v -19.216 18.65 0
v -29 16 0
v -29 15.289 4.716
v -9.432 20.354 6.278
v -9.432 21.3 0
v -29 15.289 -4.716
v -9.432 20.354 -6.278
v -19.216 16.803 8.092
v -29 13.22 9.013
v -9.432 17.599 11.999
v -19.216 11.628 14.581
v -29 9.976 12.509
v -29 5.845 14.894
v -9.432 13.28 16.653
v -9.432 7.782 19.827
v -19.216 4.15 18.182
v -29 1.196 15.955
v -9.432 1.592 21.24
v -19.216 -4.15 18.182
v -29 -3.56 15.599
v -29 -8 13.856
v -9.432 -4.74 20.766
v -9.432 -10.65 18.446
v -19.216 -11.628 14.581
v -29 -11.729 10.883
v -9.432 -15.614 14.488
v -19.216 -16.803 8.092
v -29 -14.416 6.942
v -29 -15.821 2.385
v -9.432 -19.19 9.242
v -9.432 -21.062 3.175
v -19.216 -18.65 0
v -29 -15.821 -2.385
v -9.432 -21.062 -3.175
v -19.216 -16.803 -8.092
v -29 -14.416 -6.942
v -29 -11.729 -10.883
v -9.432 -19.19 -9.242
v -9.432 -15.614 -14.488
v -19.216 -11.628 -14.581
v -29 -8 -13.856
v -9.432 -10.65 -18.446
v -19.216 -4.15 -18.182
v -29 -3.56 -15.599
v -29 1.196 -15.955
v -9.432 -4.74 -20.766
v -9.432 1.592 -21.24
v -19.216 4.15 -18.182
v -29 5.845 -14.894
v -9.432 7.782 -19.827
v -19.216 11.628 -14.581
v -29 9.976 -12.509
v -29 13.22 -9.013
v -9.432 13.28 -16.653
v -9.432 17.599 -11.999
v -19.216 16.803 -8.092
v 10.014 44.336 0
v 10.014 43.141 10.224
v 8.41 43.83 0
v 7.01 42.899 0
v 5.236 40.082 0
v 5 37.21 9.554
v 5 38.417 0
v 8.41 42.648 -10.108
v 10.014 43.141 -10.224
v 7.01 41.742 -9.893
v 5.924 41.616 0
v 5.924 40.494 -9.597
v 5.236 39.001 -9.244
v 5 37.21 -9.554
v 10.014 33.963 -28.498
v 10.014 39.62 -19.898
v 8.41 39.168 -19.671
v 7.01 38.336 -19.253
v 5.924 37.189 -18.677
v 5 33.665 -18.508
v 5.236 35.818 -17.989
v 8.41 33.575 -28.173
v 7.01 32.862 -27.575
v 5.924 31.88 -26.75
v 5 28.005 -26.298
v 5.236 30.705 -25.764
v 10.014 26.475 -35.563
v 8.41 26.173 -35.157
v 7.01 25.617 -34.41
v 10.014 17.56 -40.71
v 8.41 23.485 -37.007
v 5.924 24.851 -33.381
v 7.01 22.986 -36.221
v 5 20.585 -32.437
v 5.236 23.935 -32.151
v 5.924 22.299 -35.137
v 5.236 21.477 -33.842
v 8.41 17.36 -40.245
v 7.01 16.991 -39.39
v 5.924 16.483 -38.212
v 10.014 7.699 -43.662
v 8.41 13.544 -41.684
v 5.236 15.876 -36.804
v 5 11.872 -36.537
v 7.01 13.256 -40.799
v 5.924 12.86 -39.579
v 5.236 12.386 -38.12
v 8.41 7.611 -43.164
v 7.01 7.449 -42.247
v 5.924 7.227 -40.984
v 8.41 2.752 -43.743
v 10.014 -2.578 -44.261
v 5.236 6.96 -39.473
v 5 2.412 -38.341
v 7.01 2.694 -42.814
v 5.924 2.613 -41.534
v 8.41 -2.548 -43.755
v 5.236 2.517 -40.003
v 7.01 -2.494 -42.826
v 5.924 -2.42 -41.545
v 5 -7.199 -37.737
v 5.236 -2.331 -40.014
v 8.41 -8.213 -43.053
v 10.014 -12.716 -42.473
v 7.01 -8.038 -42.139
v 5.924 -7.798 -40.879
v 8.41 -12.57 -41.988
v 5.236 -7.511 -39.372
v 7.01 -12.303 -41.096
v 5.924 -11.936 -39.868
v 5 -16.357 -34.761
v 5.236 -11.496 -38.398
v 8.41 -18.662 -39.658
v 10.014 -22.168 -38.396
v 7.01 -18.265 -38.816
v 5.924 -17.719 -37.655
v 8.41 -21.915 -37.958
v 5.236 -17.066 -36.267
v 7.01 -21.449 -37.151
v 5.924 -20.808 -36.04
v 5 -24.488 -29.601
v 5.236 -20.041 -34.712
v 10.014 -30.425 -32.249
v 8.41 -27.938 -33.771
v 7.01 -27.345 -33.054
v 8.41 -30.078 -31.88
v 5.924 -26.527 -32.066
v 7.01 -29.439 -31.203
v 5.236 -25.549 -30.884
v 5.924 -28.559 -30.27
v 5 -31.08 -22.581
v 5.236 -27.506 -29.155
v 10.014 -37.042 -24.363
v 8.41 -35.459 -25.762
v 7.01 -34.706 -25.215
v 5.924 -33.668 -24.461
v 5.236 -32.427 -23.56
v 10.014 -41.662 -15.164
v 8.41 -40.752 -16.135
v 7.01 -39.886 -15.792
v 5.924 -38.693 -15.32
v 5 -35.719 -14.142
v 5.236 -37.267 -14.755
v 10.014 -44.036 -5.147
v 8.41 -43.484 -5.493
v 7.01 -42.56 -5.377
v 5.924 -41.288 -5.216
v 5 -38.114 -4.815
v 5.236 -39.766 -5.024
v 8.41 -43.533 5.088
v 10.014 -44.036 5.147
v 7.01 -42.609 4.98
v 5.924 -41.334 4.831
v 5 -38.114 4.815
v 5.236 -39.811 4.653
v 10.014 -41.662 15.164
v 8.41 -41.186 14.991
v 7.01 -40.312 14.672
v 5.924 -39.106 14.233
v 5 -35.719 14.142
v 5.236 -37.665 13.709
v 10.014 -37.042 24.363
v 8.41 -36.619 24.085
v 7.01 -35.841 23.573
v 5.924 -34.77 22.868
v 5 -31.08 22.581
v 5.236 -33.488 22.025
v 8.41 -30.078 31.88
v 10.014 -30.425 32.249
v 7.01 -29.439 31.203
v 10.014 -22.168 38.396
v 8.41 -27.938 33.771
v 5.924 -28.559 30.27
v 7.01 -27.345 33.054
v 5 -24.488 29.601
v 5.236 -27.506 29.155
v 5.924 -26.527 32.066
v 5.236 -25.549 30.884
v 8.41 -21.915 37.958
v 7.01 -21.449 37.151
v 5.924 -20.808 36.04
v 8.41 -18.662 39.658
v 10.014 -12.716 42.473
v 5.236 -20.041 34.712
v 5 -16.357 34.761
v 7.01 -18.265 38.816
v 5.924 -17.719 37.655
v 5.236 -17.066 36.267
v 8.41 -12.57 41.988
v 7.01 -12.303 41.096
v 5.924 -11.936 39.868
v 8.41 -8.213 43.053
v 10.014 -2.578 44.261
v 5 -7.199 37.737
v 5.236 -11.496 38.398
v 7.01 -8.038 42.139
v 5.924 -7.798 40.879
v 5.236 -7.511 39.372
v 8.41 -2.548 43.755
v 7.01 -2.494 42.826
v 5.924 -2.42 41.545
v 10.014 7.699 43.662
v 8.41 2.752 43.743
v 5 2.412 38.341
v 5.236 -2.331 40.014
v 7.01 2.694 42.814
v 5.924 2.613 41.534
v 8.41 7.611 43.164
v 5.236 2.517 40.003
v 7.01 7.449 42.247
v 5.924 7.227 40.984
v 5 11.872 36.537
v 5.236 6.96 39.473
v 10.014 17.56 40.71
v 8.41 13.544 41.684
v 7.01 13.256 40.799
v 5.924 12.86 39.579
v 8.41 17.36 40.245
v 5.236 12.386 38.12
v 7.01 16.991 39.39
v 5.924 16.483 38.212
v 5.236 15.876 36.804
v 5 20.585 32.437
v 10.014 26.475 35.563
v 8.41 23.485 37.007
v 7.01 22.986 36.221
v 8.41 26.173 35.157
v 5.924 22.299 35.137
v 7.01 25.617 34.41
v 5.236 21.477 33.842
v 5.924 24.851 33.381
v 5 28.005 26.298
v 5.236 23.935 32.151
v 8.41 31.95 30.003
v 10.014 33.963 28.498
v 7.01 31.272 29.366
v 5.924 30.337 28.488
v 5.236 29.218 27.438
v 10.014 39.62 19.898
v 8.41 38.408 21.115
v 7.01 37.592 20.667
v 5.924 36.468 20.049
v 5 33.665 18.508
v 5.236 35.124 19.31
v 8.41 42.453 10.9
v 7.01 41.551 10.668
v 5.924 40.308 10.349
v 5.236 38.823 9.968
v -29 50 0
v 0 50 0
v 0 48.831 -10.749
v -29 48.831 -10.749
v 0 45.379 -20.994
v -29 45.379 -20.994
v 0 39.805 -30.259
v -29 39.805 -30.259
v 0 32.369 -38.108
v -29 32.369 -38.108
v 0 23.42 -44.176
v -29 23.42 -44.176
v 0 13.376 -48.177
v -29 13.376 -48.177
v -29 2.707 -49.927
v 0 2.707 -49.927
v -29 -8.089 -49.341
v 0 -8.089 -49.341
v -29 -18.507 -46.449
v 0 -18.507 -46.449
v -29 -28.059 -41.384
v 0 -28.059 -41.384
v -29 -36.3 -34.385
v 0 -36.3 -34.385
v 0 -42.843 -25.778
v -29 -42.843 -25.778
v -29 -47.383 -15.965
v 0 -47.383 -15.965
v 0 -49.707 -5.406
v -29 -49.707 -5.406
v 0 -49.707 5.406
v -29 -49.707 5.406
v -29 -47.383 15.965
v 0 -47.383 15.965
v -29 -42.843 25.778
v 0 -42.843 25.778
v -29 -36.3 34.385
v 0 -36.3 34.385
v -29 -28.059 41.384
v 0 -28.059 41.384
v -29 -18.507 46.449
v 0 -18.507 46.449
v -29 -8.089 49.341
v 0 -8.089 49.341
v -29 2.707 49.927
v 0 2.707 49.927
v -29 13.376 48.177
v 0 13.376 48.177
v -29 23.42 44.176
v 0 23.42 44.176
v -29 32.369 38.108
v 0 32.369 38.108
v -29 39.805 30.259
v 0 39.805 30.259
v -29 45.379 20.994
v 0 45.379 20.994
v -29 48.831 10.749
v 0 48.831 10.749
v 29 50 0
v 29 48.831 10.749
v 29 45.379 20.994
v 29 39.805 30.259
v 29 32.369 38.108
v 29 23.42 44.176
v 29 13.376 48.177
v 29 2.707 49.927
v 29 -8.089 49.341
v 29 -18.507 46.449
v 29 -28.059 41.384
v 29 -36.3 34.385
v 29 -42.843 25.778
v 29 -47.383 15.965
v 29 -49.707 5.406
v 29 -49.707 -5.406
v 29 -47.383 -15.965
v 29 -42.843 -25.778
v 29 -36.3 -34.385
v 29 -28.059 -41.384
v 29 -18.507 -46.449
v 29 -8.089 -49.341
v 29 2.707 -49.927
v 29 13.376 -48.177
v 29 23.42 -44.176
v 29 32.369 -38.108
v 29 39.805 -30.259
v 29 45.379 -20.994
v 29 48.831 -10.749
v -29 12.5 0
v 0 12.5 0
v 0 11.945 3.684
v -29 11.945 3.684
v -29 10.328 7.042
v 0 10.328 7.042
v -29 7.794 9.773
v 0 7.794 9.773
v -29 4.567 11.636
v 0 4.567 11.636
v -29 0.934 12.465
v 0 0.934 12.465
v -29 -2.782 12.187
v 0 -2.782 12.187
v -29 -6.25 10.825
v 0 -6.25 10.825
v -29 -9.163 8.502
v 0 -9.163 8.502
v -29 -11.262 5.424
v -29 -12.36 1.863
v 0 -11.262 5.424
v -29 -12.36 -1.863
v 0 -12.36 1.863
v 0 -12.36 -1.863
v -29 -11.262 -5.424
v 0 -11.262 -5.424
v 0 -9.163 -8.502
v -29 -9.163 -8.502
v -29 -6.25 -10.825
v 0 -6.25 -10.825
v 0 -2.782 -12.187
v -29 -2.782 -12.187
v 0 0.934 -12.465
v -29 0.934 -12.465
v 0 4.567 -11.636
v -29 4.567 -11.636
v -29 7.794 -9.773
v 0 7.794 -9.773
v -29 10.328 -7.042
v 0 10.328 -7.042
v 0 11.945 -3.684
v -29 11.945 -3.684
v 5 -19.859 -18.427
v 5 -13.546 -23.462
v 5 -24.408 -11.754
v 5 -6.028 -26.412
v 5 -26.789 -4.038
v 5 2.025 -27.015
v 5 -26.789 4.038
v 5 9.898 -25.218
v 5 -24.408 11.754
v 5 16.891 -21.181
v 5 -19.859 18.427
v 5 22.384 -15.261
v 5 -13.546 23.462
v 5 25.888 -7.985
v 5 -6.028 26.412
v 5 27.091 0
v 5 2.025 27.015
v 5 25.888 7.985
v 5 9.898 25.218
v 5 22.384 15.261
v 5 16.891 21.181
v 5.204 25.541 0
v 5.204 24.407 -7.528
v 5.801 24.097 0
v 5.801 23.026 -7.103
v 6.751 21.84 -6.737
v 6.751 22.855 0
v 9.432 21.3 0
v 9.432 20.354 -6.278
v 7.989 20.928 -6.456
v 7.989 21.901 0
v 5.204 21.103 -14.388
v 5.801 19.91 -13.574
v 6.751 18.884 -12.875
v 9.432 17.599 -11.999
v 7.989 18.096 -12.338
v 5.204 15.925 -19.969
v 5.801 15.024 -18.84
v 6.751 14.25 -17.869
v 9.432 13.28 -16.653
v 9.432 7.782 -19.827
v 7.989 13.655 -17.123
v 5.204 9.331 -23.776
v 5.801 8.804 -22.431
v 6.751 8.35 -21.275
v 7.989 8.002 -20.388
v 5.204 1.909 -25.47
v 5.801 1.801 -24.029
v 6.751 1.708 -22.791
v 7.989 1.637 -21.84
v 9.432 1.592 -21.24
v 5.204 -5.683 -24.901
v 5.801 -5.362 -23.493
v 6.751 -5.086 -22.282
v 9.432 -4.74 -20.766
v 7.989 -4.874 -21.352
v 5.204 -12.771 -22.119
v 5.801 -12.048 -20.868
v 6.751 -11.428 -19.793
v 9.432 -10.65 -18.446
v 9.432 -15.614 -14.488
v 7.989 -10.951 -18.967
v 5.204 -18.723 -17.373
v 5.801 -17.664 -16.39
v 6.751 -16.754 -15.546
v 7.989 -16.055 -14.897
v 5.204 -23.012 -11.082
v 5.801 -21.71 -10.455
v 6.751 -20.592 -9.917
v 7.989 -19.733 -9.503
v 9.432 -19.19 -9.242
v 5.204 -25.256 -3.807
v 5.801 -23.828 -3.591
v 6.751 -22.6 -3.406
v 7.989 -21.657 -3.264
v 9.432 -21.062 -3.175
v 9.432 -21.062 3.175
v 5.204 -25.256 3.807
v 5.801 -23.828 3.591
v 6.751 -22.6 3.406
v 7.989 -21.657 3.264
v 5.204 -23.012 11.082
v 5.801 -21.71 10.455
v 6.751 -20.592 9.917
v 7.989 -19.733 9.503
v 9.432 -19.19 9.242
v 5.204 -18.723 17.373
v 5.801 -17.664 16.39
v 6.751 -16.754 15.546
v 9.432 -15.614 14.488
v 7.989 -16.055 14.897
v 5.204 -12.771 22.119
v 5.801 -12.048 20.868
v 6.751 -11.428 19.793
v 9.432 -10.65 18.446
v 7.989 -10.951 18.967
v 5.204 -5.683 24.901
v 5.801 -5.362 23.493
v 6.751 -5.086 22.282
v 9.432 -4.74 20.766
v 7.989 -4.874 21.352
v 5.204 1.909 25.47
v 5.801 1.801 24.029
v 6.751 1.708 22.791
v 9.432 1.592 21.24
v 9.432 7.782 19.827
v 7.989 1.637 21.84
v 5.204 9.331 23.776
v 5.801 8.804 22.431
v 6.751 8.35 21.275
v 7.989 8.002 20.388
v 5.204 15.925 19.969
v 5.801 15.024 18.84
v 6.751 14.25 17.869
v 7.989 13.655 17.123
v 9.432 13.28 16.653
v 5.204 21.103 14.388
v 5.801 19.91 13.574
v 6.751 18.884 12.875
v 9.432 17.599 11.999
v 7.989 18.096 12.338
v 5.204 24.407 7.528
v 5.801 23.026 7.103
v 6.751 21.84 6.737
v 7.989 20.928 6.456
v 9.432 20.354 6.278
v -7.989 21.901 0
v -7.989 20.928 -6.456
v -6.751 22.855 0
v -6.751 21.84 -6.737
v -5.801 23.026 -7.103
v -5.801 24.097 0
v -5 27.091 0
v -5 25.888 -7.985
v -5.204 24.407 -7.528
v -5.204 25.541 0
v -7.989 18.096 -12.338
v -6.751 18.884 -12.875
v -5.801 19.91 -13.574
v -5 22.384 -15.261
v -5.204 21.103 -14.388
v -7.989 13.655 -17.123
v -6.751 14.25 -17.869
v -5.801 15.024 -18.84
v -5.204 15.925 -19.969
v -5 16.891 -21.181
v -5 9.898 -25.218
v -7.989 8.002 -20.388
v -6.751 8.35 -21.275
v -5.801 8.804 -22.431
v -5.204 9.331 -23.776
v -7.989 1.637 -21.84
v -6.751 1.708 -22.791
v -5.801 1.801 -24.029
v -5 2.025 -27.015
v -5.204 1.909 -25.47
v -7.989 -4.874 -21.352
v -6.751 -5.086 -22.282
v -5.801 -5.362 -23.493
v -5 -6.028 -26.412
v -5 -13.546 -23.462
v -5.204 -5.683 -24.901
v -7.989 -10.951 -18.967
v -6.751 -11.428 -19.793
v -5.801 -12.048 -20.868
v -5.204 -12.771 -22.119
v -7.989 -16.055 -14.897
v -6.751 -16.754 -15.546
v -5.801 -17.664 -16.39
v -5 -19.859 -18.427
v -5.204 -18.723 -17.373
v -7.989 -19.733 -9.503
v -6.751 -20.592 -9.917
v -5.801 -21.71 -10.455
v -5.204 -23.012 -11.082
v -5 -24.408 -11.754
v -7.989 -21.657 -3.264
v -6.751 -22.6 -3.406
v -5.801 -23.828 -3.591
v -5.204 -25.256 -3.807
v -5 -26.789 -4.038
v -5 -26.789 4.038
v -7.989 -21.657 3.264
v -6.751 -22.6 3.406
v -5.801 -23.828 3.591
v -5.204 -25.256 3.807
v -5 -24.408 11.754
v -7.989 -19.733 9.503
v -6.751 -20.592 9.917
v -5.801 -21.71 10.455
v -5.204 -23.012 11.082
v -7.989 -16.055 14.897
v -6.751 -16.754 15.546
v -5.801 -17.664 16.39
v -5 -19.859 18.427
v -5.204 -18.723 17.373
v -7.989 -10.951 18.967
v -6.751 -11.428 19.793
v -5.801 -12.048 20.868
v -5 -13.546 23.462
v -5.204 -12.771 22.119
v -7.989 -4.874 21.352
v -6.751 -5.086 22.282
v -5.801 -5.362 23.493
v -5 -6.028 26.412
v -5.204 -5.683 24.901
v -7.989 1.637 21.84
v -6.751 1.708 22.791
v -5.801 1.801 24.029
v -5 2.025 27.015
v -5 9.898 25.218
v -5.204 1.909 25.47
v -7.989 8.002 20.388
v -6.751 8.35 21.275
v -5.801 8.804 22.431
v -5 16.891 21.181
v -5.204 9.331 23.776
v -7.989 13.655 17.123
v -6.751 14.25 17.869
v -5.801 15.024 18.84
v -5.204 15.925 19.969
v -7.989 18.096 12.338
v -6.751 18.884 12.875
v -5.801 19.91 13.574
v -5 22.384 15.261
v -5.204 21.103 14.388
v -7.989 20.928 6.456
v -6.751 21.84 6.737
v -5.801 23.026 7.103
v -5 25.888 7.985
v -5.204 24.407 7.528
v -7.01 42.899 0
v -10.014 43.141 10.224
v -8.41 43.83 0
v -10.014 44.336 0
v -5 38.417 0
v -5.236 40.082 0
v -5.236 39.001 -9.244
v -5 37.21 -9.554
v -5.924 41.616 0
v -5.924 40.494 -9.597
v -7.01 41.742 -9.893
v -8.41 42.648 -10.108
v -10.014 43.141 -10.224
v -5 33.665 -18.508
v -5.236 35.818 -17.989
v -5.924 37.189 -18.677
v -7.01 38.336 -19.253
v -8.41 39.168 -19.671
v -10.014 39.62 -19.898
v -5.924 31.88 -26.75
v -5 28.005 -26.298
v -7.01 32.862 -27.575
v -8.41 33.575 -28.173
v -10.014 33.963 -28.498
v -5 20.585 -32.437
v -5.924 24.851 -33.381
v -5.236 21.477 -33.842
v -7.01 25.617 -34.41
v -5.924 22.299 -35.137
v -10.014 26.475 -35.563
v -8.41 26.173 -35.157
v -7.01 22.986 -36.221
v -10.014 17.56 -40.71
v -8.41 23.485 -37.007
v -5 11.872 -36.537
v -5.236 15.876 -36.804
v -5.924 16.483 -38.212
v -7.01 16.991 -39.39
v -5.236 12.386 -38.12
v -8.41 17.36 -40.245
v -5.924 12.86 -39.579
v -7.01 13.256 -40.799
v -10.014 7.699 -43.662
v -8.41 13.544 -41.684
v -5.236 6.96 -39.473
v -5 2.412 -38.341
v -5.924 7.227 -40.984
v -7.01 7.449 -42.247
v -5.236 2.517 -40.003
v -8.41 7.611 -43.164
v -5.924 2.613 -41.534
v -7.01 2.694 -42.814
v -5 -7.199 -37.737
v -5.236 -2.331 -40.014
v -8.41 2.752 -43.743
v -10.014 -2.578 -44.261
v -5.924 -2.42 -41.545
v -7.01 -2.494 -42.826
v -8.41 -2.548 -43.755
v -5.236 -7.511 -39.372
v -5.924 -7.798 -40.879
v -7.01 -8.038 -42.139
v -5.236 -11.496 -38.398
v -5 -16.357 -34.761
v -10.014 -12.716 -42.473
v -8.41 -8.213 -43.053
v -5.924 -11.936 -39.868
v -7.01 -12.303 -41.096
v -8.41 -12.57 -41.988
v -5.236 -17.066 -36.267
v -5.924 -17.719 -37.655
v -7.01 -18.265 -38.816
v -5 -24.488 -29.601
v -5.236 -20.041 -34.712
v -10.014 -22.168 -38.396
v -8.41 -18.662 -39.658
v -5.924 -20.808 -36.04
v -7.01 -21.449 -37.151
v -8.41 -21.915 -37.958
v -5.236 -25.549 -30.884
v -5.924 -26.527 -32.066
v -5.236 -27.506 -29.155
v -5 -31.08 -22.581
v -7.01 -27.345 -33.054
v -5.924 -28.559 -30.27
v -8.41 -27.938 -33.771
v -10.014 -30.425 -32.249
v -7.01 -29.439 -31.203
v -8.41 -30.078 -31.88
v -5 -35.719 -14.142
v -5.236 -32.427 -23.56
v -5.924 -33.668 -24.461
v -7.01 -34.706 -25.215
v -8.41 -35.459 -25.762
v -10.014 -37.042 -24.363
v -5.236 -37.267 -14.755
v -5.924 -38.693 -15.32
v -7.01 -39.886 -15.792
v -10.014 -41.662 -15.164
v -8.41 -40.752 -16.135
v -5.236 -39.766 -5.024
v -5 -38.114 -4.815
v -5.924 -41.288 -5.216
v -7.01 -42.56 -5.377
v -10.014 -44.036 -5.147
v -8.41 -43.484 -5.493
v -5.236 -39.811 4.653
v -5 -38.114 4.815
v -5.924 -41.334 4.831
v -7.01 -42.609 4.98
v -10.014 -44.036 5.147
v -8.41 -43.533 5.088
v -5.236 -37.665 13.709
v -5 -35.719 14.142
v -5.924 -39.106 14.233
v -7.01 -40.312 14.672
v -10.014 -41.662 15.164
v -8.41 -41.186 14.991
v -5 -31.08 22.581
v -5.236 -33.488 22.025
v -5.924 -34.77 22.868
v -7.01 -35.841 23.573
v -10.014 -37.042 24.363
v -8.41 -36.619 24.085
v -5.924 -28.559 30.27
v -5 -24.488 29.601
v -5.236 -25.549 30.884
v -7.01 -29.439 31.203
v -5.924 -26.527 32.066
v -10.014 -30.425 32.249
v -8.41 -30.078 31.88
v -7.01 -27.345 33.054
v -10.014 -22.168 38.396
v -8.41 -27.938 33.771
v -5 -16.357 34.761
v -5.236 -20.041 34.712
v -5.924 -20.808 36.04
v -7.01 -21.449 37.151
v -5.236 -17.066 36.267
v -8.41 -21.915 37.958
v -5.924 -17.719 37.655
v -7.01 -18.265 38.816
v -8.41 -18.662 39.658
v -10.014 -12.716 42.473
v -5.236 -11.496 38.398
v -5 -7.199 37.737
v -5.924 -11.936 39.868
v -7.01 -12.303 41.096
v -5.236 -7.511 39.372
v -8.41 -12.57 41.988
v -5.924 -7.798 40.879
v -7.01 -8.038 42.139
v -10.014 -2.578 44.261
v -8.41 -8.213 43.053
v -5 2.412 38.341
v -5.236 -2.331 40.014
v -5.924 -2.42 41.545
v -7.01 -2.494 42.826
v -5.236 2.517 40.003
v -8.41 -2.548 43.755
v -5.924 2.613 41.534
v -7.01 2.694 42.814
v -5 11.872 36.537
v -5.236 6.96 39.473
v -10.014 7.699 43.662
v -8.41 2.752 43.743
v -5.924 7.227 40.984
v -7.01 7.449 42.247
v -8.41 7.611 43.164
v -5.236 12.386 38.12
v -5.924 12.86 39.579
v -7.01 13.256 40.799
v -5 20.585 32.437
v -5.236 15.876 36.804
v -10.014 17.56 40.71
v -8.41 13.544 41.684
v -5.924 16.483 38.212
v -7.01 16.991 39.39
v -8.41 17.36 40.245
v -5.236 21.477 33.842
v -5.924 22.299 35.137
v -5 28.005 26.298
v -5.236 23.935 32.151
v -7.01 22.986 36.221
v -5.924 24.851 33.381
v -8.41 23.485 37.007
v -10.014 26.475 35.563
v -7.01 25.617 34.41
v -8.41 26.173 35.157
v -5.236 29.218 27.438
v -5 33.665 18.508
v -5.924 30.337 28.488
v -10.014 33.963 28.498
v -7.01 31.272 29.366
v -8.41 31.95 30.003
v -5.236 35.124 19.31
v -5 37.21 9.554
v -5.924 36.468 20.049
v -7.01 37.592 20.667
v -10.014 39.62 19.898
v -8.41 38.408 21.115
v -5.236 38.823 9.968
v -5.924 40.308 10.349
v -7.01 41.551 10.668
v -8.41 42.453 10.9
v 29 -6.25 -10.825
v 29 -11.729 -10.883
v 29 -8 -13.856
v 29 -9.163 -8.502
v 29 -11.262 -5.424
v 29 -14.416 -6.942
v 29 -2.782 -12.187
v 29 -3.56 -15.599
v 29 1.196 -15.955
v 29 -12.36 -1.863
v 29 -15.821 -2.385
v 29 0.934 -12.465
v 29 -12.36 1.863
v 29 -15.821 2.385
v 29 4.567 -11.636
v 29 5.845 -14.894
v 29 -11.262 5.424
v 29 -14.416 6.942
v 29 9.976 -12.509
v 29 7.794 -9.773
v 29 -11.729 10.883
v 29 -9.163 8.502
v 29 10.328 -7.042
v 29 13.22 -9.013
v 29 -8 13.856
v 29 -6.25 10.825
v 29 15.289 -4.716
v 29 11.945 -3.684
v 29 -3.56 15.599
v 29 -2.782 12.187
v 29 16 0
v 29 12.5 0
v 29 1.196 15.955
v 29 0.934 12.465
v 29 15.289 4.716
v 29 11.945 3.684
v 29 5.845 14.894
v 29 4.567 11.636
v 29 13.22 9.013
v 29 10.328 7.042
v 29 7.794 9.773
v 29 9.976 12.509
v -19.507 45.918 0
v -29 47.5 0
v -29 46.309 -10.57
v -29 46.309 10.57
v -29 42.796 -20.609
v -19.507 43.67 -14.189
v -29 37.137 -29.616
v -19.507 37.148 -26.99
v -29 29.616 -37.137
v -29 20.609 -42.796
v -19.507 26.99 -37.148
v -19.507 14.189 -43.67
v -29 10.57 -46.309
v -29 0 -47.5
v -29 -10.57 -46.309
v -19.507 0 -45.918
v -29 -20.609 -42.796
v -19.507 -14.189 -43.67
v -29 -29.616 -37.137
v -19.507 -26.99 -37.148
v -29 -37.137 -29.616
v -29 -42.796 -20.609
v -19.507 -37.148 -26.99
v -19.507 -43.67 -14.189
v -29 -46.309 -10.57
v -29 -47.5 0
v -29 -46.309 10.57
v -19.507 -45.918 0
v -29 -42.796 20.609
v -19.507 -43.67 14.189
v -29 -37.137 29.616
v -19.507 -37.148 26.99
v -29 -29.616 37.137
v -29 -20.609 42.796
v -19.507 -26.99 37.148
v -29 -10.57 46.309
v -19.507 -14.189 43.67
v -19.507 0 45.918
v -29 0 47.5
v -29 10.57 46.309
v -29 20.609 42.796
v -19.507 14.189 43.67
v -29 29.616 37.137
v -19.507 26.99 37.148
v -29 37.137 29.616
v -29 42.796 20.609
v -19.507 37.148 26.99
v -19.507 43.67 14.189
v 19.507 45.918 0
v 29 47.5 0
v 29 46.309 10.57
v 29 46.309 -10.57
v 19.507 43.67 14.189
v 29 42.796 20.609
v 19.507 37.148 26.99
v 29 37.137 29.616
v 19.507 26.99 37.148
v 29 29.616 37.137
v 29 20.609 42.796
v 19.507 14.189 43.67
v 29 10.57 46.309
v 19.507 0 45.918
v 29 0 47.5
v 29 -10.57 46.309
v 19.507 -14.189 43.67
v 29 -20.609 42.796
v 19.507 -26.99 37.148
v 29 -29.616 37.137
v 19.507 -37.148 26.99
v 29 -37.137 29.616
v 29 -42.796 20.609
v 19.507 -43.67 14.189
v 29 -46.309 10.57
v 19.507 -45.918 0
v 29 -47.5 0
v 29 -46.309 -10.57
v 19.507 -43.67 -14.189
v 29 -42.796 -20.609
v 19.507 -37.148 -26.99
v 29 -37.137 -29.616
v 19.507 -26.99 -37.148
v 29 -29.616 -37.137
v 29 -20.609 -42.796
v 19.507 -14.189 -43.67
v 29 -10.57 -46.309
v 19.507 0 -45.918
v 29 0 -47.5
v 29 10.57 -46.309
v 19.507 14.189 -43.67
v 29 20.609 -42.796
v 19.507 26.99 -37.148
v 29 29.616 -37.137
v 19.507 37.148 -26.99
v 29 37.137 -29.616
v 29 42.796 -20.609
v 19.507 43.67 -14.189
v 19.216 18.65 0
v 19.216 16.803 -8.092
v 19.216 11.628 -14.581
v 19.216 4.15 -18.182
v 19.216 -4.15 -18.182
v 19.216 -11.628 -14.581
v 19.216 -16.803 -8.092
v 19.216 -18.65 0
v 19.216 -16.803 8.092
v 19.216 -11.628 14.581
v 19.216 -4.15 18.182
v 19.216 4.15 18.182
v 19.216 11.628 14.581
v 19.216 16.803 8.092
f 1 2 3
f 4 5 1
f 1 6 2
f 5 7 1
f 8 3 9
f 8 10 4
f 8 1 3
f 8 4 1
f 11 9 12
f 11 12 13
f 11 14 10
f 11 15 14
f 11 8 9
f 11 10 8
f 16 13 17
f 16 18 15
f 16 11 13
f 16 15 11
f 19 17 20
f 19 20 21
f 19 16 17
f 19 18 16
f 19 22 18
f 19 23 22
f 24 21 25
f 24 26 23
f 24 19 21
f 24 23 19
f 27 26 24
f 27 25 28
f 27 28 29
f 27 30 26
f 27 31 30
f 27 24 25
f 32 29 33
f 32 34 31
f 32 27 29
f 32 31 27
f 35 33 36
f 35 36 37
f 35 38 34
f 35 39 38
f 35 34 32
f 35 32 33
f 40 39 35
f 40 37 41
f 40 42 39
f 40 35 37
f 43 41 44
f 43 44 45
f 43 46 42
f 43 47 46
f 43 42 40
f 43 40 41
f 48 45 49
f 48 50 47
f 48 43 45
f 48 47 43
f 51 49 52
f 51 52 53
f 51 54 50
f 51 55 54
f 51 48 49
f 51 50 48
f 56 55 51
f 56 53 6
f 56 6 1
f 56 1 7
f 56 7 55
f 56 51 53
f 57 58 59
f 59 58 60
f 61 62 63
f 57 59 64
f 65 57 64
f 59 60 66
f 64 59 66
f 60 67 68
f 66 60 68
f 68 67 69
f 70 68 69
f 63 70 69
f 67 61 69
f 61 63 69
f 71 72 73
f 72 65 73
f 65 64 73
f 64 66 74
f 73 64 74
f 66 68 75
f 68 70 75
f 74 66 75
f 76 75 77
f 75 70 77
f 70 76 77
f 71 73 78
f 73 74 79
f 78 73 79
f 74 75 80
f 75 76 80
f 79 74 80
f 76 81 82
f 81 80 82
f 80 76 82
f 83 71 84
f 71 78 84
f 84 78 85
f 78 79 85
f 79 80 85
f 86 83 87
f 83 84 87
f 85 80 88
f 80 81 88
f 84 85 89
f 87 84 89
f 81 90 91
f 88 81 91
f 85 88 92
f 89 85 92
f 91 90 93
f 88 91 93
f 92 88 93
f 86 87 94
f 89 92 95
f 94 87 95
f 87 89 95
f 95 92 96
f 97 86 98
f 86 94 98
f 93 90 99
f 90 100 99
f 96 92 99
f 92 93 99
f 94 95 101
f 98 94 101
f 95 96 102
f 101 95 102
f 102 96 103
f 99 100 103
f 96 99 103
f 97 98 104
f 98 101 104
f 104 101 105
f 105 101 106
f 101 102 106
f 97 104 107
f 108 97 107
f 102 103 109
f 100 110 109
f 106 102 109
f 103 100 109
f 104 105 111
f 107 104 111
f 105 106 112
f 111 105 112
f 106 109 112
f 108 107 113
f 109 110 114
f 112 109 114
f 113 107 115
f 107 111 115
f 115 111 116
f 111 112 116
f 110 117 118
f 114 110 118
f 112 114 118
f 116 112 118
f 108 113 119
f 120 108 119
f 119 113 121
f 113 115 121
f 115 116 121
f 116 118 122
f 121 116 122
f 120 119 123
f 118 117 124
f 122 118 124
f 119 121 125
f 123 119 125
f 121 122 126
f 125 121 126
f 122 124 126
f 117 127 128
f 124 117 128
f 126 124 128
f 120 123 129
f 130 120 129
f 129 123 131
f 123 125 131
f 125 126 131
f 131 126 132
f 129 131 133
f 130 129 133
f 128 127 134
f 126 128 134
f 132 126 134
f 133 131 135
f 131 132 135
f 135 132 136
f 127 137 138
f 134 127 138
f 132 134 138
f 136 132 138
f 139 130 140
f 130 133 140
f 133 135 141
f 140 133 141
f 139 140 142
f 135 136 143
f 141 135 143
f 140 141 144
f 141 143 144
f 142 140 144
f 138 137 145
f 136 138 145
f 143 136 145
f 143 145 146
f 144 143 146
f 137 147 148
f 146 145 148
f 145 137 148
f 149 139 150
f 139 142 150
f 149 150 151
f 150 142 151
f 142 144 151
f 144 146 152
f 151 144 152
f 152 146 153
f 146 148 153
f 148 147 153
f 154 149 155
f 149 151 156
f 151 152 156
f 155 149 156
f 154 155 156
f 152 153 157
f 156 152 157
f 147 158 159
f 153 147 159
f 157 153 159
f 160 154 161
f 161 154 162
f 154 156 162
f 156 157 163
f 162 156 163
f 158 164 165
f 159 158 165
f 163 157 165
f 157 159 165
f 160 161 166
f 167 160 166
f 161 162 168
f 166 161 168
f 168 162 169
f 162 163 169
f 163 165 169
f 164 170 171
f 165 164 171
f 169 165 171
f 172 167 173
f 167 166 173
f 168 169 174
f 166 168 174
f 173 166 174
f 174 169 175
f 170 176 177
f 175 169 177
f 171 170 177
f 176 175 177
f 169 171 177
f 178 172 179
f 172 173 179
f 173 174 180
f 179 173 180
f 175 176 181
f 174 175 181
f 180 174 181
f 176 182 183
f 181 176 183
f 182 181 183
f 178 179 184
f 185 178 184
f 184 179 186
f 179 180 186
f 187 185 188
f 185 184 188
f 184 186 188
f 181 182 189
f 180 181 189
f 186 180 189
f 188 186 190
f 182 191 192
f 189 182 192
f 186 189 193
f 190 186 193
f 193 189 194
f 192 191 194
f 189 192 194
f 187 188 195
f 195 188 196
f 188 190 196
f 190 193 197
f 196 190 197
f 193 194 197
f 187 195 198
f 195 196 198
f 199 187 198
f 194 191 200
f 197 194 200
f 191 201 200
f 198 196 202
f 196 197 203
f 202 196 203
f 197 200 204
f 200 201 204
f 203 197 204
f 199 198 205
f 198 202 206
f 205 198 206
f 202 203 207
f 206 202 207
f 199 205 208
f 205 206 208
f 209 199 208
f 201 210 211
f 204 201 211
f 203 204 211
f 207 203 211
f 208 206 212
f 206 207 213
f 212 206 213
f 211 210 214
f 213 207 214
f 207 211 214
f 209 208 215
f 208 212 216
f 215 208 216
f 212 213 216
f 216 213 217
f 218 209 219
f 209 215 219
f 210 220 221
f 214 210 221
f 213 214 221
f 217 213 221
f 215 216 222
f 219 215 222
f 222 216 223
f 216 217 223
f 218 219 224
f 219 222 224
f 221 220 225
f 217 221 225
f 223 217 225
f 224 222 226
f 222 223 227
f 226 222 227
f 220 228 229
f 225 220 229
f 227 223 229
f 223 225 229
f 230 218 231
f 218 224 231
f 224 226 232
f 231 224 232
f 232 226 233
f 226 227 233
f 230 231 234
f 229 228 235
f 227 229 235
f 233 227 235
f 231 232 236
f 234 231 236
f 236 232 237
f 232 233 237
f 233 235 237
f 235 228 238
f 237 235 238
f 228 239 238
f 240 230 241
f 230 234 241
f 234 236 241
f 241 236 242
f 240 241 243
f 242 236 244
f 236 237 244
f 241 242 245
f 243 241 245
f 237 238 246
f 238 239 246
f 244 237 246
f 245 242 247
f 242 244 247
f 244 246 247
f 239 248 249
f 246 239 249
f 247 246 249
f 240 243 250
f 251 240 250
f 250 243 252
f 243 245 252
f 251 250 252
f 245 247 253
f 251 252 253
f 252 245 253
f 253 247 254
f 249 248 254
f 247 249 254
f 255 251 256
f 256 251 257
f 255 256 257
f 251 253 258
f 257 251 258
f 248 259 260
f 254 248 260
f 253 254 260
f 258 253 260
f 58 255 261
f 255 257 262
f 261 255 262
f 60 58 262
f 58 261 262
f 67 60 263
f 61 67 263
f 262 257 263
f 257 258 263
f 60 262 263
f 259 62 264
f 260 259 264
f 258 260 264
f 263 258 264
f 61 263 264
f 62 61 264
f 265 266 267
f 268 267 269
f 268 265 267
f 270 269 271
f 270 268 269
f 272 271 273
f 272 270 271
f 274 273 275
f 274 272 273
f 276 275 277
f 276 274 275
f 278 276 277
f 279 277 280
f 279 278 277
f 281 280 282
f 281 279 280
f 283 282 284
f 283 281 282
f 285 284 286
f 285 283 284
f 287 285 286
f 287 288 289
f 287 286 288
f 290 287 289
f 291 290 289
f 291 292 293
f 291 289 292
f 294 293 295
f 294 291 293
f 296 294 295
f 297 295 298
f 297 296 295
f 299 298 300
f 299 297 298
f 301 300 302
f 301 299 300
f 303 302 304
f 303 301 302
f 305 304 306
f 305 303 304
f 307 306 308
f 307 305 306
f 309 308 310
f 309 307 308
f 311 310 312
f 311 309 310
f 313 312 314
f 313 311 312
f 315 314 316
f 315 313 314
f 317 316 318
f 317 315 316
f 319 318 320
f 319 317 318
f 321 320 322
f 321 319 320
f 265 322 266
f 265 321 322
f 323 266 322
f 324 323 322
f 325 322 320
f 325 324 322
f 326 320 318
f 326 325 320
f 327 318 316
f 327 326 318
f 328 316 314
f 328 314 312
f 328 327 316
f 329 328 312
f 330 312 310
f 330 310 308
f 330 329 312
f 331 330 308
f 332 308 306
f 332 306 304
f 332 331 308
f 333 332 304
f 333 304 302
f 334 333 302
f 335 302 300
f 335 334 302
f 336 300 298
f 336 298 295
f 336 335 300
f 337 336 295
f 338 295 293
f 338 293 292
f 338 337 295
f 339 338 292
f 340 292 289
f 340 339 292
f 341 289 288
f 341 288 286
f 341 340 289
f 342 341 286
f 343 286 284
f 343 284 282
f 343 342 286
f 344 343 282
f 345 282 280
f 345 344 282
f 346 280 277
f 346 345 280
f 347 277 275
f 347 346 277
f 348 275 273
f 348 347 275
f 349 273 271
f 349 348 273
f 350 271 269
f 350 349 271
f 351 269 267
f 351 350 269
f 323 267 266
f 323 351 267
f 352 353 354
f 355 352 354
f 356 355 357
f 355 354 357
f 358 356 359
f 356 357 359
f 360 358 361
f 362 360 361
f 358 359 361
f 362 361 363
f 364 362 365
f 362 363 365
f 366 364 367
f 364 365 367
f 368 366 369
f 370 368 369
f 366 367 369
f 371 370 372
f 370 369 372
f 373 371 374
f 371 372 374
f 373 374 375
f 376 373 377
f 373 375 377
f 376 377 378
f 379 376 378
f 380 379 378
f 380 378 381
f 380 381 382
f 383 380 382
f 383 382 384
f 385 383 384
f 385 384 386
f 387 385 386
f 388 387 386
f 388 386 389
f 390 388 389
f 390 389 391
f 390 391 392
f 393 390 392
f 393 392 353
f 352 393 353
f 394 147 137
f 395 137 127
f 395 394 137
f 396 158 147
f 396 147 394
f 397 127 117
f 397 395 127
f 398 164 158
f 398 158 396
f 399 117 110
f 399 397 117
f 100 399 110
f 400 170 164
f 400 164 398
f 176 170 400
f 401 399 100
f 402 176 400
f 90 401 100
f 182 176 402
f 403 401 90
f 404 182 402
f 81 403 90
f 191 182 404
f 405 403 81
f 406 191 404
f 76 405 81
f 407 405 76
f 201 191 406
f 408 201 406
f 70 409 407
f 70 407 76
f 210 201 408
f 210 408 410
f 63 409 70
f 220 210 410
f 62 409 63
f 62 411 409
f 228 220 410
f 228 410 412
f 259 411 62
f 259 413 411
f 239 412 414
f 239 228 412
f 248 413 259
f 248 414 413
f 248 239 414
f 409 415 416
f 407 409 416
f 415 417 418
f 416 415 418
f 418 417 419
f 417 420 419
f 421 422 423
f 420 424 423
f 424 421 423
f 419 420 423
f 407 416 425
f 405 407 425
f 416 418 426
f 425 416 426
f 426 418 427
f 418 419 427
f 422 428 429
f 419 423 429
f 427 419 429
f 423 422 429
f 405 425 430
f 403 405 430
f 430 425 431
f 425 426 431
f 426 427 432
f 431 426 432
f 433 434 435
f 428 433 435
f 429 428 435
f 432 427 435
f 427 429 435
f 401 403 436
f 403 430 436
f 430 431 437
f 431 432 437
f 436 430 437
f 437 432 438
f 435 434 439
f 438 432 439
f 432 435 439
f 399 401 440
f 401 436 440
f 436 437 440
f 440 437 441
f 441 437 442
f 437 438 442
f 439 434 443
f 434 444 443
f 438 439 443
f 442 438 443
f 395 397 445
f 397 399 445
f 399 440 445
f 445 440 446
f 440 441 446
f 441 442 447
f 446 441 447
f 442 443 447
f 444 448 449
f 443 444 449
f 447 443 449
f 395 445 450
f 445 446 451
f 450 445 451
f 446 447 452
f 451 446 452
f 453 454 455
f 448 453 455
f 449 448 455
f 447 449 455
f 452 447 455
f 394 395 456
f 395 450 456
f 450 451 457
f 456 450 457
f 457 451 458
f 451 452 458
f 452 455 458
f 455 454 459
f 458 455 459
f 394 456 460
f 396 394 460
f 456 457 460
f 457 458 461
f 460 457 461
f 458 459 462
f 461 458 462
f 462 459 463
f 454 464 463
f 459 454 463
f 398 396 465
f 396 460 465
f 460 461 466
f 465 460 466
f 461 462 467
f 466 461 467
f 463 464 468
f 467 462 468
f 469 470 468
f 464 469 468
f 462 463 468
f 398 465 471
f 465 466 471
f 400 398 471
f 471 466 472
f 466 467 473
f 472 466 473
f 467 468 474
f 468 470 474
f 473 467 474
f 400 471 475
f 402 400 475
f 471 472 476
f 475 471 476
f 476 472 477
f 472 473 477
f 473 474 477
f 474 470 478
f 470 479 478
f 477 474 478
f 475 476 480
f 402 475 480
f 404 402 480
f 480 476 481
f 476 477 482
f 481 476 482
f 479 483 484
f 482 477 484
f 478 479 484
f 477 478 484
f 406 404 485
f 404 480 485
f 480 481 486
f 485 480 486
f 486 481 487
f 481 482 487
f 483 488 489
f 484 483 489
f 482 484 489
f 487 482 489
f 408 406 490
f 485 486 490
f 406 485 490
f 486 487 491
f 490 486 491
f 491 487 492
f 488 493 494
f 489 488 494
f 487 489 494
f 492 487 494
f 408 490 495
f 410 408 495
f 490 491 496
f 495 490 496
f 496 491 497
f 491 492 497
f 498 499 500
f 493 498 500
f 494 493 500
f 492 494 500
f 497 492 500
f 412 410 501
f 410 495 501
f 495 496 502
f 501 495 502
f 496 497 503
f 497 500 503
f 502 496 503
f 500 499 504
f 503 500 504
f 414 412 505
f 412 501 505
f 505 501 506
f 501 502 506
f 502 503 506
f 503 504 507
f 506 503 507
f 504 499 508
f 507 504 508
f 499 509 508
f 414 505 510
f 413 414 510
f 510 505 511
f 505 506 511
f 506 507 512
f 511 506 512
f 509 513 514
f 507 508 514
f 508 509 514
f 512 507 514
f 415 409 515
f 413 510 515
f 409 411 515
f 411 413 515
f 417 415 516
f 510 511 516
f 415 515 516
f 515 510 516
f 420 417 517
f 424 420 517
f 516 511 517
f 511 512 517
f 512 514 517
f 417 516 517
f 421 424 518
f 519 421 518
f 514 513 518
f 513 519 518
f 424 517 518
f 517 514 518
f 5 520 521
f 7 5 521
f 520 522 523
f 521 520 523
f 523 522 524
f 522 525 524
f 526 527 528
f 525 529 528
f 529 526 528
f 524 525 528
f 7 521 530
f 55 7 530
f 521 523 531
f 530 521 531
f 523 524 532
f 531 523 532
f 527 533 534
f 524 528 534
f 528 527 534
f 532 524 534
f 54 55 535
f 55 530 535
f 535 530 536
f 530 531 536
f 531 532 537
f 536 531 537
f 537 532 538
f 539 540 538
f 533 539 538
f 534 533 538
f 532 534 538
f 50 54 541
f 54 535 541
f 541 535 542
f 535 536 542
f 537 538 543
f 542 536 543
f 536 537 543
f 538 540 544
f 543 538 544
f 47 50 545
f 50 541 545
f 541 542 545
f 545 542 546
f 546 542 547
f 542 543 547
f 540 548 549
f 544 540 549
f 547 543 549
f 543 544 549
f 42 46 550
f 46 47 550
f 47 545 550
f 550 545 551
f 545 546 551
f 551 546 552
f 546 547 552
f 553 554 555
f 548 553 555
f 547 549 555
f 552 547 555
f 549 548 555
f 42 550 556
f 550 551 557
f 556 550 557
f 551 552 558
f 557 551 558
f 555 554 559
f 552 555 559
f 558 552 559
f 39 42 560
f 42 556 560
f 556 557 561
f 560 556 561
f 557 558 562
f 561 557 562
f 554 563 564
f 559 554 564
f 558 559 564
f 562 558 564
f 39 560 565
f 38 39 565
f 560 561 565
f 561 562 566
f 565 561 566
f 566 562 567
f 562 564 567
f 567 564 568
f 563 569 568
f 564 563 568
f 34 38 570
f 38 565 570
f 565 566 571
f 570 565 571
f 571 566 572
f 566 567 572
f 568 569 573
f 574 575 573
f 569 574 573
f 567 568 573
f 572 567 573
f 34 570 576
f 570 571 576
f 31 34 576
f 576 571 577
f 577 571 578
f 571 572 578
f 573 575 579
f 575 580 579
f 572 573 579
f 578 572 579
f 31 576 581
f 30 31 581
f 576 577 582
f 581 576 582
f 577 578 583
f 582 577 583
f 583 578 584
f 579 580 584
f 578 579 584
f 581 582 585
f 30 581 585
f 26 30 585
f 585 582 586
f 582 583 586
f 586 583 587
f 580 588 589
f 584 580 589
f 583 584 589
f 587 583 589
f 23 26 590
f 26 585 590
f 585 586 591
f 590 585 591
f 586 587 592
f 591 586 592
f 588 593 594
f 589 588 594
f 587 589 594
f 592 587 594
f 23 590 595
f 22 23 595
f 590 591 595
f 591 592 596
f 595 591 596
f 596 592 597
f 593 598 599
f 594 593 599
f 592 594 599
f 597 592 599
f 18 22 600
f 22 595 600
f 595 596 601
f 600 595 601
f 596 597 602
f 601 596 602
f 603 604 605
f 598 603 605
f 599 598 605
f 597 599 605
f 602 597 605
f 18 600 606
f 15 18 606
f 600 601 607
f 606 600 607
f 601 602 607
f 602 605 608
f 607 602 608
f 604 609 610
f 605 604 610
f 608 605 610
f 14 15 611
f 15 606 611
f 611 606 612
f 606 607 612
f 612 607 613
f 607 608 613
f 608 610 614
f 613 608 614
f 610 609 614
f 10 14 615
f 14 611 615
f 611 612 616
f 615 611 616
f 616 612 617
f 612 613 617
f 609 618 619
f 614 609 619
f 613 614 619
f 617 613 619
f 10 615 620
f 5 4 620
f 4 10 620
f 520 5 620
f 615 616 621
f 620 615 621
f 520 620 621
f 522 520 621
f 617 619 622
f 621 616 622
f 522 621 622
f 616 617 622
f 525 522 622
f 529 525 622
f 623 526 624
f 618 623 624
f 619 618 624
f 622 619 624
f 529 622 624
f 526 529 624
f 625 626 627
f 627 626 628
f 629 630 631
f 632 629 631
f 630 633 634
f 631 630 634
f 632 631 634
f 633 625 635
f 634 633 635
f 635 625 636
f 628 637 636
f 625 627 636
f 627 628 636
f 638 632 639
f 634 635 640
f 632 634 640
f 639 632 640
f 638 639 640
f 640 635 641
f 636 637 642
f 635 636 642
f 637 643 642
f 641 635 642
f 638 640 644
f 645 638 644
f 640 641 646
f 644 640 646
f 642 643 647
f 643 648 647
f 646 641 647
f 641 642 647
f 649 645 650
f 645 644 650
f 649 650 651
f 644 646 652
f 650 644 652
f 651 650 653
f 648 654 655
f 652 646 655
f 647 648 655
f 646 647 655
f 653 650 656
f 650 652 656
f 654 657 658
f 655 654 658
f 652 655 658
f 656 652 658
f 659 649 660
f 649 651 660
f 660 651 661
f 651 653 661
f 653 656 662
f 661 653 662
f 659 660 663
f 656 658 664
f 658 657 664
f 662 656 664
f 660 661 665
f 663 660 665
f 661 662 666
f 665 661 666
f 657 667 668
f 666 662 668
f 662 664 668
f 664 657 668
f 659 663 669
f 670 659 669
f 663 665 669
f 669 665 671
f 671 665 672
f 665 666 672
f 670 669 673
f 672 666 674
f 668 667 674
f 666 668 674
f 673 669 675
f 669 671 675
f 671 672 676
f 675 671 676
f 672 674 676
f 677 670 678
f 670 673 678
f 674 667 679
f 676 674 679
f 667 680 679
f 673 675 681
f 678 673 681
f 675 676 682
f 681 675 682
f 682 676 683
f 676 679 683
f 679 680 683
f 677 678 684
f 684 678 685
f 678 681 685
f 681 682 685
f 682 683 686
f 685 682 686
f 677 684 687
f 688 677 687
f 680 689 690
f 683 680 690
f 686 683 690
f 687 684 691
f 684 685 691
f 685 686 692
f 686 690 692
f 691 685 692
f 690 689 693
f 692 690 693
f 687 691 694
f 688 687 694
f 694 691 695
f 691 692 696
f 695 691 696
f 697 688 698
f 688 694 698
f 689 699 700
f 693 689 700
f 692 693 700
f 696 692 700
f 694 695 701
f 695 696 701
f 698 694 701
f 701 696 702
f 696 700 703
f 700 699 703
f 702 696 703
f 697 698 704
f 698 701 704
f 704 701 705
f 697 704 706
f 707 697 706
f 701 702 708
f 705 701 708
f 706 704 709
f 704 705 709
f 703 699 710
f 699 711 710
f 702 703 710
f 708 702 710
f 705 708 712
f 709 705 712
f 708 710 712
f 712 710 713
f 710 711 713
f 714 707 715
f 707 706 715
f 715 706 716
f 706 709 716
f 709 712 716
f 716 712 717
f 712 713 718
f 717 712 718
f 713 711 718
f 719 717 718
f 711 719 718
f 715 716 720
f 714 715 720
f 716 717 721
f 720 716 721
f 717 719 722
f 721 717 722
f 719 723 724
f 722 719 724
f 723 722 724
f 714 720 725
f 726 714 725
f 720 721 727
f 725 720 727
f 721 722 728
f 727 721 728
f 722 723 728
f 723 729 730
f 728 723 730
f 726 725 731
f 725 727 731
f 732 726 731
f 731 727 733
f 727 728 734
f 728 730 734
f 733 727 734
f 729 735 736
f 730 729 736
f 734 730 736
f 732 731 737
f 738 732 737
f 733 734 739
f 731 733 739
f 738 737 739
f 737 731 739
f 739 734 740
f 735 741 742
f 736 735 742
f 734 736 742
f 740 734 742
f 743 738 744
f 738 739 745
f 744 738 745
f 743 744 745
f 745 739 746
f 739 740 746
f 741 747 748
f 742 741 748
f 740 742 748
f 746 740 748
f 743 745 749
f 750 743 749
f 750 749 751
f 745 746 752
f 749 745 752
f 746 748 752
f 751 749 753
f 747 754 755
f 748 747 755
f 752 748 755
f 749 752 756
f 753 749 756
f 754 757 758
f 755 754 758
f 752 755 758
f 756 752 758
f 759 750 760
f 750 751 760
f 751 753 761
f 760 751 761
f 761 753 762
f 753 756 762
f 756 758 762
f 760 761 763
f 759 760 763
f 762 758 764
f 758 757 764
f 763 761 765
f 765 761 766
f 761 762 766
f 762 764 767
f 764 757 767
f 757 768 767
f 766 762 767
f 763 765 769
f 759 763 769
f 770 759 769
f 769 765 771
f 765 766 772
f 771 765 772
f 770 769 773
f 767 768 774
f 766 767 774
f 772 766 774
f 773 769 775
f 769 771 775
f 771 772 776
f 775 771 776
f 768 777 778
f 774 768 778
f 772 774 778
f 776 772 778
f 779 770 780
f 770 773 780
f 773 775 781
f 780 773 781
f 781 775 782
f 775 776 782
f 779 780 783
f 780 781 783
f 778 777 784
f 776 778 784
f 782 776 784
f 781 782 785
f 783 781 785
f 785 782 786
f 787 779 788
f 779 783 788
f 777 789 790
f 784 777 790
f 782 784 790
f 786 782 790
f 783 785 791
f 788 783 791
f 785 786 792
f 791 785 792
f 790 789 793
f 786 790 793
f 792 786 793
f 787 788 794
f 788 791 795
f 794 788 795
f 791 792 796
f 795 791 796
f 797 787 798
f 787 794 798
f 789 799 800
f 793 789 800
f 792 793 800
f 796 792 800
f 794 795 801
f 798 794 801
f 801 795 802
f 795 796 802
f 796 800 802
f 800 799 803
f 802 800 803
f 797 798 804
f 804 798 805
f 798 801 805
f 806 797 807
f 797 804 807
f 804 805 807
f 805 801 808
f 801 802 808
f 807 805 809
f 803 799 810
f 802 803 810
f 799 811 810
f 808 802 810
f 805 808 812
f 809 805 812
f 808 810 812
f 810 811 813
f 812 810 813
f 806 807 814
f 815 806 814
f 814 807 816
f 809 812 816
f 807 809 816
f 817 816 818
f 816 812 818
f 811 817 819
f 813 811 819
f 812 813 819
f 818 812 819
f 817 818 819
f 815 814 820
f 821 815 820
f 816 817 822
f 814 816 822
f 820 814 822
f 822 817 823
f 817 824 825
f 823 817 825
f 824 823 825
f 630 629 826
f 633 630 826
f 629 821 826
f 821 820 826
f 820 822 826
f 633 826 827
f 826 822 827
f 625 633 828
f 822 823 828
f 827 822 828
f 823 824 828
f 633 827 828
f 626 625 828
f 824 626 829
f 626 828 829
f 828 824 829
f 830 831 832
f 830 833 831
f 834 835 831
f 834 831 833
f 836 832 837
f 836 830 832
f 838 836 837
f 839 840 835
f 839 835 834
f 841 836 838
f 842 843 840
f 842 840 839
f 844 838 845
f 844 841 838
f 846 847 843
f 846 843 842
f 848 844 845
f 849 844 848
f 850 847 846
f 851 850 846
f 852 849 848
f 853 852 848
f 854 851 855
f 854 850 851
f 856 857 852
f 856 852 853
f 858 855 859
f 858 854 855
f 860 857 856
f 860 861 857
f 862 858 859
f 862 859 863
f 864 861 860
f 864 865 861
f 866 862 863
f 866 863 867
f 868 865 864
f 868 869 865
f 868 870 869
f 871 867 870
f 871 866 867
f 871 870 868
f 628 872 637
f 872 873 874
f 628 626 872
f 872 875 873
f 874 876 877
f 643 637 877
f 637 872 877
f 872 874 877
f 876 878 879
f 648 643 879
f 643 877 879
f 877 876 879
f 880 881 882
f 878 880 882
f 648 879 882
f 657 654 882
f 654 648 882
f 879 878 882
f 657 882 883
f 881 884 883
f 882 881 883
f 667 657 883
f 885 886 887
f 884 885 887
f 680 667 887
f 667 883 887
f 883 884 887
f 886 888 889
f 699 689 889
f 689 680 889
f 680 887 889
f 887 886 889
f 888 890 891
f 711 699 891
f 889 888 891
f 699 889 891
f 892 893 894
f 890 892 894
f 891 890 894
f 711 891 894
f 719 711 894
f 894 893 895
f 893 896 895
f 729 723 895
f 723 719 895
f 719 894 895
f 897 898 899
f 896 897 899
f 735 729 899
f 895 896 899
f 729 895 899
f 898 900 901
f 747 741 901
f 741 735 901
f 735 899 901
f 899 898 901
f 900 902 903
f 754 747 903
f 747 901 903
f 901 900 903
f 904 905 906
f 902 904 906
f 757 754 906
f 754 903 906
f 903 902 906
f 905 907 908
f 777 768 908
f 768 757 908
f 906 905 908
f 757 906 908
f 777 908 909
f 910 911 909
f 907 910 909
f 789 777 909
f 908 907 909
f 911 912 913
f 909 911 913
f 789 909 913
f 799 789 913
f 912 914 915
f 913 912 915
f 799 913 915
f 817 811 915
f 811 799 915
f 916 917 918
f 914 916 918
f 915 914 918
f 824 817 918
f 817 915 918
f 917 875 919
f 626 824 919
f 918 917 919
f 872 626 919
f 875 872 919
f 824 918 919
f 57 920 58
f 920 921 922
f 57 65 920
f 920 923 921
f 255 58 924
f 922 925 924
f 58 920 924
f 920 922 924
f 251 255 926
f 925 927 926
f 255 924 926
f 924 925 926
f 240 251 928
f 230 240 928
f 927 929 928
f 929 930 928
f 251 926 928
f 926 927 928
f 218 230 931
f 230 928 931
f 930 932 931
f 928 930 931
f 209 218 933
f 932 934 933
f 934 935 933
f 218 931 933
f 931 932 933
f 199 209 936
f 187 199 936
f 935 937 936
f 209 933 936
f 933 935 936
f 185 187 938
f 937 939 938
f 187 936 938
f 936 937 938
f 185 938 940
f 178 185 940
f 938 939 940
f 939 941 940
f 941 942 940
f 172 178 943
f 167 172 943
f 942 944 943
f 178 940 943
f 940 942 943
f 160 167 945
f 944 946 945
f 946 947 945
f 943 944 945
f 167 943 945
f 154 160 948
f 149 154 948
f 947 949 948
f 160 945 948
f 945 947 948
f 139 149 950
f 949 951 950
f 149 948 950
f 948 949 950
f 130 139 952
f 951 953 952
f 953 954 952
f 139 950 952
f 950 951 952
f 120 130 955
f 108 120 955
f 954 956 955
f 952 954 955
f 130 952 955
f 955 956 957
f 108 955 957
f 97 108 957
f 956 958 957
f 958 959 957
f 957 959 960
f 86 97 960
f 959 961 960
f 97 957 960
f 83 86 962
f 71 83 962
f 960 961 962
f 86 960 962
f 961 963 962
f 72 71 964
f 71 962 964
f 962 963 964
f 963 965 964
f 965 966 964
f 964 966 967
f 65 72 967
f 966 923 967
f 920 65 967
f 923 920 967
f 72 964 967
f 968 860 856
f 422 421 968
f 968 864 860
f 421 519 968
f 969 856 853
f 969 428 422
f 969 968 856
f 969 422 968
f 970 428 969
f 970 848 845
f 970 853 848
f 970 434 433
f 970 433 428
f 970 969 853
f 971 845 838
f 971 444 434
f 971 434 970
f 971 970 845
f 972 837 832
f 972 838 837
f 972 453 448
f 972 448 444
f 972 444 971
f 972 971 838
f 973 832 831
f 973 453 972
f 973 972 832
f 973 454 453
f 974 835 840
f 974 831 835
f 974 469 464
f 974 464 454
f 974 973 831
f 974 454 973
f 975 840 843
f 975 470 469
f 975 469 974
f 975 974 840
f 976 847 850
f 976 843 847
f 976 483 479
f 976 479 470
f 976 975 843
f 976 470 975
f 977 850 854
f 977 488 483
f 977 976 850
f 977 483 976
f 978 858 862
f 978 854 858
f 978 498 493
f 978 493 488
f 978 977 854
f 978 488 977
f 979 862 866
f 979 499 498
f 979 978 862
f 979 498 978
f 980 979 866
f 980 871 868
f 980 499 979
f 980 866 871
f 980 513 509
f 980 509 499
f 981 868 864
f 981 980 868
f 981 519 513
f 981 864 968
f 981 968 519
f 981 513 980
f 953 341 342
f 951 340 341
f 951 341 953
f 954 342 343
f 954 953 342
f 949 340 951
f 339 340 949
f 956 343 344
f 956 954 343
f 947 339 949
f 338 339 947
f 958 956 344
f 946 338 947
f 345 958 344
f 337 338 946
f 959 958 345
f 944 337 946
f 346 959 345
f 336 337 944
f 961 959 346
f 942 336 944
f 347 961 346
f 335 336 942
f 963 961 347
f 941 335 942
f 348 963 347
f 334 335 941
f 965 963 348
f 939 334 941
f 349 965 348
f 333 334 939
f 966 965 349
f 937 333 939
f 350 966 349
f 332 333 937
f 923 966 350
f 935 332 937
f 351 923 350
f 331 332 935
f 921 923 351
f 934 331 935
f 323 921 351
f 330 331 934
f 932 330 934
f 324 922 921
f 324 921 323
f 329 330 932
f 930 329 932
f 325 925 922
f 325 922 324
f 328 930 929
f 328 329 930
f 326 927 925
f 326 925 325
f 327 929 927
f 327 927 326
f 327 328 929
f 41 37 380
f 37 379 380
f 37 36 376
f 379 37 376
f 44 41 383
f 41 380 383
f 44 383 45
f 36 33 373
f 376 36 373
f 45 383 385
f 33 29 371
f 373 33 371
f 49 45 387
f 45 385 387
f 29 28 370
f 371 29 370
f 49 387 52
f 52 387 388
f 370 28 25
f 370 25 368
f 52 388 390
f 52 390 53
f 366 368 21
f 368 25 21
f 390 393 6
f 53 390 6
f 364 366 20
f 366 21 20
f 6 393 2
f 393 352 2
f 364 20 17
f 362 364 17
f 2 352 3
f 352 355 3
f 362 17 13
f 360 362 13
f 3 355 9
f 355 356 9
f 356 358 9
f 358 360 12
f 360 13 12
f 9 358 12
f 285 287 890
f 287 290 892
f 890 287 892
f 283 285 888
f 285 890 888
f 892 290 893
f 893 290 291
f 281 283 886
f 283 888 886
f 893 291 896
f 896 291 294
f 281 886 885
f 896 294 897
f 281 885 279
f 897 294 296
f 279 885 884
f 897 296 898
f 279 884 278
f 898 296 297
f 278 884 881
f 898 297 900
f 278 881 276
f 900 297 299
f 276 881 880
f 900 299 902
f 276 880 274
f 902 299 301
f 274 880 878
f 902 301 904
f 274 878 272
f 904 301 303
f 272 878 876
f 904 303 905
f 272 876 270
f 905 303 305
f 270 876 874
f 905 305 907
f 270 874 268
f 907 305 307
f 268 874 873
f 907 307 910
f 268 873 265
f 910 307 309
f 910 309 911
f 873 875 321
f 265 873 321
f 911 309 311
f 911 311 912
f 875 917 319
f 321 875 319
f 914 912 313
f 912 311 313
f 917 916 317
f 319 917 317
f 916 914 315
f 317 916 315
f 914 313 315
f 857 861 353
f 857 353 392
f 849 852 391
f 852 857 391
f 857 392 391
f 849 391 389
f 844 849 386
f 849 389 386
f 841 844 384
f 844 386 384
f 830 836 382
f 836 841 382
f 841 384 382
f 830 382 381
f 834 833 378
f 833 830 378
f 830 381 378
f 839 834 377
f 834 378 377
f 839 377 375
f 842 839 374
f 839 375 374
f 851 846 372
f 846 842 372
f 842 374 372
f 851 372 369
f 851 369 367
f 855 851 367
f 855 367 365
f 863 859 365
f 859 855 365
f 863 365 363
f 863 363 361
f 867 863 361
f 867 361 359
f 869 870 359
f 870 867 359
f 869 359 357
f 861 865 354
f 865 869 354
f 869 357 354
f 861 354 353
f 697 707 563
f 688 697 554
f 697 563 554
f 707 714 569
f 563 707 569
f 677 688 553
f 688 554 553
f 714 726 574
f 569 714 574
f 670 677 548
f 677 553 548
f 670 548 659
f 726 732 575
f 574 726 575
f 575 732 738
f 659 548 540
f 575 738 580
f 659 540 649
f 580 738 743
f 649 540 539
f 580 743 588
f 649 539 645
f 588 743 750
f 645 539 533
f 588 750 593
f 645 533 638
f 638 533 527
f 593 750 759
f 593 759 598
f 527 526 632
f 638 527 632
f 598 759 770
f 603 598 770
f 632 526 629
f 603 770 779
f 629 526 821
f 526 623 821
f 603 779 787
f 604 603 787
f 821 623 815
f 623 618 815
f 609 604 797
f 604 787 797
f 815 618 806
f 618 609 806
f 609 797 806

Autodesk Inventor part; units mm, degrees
ref_plane "YZ Plane" through (0, 0, 0) normal (1, 0, 0) x (0, 1, 0)
ref_plane "XZ Plane" through (0, 0, 0) normal (0, 1, 0) x (-1, 0, 0)
ref_plane "XY Plane" through (0, 0, 0) normal (0, 0, 1) x (1, 0, 0)
sketch "Sketch1" plane through (0, 0, 0) normal (0, 0, 1) x (1, 0, 0)
  line L0 (-26.0293, 0) -> (0, 0)
  line L1 (0, 0) -> (26.0293, 0)
  line L2 (0, 0) -> (0, 50) construction
  line L3 (0, 50) -> (29, 50)
  line L4 (29, 50) -> (29, 47.5)
  line L5 (29, 47.5) -> (5, 43.5)
  line L6 (5, 43.5) -> (5, 22.5)
  line L7 (5, 22.5) -> (29, 16)
  line L8 (29, 16) -> (29, 12.5)
  line L9 (29, 12.5) -> (0, 12.5)
  line L10 (0, 50) -> (-29, 50)
  line L11 (-29, 47.5) -> (-5, 43.5)
  line L12 (-5, 43.5) -> (-5, 22.5)
  line L13 (-5, 22.5) -> (-29, 16)
  line L14 (-29, 16) -> (-29, 12.5)
  line L15 (-29, 12.5) -> (0, 12.5)
  line L16 (-29, 50) -> (-29, 47.5)
  point P0 (14.5, 12.5)
  point P1 (-14.5, 12.5)
  point P2 (-5, 33)
  dimension "d0" = 100
  dimension "d1" = 95
  dimension "d2" = 87
  dimension "d3" = 45
  dimension "d4" = 25
  dimension "d5" = 32
  dimension "d6" = 58
  dimension "d7" = 10
revolve "Revolution1" add sketch "Sketch1" angle 360 about axis through (-26.0293, 0, 0) along (1, 0, 0)
fillet "Fillet1" radius 6 4 edges at (5, -43.5, 0) (5, -22.5, 0) (-5, -43.5, 0) (-5, -22.5, 0)
properties part number "04-roller" material "Stainless Steel"
